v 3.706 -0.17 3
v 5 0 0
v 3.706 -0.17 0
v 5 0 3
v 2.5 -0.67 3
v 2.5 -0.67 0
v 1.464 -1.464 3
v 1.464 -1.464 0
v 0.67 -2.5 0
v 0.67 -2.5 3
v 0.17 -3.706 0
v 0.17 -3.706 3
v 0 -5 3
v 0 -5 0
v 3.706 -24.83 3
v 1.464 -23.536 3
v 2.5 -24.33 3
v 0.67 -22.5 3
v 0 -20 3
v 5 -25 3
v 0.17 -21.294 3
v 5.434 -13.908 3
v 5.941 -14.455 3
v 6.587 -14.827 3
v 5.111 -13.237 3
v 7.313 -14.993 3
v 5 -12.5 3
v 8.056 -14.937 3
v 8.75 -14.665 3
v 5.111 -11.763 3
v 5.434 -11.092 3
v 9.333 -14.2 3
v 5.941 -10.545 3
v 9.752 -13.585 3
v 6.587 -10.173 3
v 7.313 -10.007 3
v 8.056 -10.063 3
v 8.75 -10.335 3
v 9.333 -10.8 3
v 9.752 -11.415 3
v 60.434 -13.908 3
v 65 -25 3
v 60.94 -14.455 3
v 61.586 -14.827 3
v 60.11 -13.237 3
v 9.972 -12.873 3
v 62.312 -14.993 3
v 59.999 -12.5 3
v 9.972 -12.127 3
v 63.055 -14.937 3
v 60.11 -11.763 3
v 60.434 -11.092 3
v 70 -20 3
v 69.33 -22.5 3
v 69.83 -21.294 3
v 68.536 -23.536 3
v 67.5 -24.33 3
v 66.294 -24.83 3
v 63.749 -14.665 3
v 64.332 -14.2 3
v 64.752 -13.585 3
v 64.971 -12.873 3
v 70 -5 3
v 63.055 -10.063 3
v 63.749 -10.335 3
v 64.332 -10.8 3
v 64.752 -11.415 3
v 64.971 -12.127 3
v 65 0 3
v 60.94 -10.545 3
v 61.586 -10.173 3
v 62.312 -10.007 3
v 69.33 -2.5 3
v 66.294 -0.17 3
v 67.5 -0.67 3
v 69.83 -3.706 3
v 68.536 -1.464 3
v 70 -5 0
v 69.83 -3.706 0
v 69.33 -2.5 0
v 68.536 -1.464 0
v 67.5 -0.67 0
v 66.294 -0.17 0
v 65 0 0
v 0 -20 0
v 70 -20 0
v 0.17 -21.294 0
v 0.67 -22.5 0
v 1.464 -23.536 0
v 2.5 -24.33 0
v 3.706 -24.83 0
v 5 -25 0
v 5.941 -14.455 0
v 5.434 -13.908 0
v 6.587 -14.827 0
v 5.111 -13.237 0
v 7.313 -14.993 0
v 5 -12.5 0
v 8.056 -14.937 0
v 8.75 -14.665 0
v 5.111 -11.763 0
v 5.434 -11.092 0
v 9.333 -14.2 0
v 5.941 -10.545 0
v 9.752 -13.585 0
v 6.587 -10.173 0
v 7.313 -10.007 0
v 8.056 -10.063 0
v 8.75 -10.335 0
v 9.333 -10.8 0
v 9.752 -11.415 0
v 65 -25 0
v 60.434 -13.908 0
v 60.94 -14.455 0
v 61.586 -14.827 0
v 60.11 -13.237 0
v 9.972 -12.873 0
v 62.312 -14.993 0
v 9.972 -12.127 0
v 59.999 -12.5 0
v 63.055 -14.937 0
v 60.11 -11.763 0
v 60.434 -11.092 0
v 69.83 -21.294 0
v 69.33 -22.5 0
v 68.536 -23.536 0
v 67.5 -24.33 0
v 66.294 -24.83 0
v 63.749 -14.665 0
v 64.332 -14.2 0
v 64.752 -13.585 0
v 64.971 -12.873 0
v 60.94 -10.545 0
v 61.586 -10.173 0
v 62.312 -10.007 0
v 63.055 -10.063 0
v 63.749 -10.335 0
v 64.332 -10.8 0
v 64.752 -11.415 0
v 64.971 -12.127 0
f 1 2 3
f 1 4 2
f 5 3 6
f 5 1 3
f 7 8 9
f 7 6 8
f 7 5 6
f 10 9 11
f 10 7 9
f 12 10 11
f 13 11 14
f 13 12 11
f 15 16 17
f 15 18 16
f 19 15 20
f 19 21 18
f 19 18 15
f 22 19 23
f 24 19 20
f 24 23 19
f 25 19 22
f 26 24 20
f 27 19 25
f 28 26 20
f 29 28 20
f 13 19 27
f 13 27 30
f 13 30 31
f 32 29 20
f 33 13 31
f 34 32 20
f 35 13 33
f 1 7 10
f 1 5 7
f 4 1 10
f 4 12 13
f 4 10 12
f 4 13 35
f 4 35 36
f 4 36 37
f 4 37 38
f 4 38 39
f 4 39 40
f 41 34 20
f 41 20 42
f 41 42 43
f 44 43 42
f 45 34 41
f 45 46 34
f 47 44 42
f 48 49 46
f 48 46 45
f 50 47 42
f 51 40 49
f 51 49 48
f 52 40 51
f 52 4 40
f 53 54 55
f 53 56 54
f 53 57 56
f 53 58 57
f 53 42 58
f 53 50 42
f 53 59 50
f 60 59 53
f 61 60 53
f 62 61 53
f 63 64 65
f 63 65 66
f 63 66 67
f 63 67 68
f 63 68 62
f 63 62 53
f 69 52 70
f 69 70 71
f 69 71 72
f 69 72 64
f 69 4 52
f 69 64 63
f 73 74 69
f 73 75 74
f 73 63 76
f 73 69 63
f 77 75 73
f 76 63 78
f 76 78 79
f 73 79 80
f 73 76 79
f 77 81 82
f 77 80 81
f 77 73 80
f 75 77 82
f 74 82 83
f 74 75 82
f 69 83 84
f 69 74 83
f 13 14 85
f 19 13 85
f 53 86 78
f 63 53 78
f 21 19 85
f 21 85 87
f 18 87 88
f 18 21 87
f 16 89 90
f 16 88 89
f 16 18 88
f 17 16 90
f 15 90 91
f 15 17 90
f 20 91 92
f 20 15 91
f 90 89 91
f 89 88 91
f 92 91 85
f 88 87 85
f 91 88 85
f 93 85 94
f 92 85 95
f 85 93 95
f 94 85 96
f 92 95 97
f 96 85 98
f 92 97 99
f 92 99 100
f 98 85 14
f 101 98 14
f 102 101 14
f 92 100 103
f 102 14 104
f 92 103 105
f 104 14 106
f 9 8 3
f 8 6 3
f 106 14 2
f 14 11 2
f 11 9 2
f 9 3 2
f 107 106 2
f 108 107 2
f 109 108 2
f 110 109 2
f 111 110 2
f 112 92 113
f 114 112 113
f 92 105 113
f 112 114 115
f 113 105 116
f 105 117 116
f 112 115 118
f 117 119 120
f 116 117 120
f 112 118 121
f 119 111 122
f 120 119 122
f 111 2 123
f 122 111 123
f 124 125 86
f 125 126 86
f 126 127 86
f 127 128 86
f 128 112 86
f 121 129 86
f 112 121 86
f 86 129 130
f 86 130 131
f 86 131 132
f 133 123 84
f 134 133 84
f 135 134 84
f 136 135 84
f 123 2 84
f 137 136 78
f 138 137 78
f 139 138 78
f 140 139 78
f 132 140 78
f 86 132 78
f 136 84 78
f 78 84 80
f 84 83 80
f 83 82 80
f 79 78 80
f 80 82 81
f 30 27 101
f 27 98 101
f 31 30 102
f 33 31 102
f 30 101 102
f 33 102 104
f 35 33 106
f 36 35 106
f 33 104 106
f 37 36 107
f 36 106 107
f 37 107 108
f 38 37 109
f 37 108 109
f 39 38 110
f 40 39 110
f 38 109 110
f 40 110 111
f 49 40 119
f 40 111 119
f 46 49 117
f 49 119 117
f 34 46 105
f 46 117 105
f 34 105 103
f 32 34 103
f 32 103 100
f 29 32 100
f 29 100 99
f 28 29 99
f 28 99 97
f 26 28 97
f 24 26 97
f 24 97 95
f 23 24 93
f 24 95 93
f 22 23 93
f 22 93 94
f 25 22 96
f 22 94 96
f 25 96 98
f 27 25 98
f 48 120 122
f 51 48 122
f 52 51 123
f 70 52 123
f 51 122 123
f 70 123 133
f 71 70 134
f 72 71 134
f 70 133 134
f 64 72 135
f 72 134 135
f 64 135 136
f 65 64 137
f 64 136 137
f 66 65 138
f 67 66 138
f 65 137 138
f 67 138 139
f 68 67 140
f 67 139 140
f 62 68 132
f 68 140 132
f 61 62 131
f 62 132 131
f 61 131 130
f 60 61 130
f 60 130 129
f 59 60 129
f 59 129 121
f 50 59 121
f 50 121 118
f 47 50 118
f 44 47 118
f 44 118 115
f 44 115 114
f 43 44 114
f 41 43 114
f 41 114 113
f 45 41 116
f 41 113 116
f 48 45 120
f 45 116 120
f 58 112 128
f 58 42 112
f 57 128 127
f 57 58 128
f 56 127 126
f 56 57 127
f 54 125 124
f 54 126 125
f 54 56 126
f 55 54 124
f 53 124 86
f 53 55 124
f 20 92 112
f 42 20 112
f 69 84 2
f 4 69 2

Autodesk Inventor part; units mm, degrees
ref_plane "YZ Plane" through (0, 0, 0) normal (1, 0, 0) x (0, 1, 0)
ref_plane "XZ Plane" through (0, 0, 0) normal (0, 1, 0) x (-1, 0, 0)
ref_plane "XY Plane" through (0, 0, 0) normal (0, 0, 1) x (1, 0, 0)
sketch "Sketch1" plane through (0, 0, 0) normal (0, 0, 1) x (1, 0, 0)
  line L0 (0, 0) -> (0, -25)
  line L1 (0, -25) -> (70, -25)
  line L2 (70, -25) -> (70, 0)
  line L3 (70, 0) -> (0, 0)
  dimension "d0" = 25
  dimension "d1" = 70
extrude "Extrusion1" add sketch "Sketch1" along normal blind 3
fillet "Fillet1" radius 5 1 edges at (70, 0, 1.5)
fillet "Fillet2" radius 5 1 edges at (70, -25, 1.5)
fillet "Fillet3" radius 5 1 edges at (0, -25, 1.5)
fillet "Fillet4" radius 5 1 edges at (0, 0, 1.5)
sketch "Sketch2" plane through (0, 0, 0) normal (0, 0, -1) x (-1, 0, 0)
  circle A0 centre (-62.4991, -12.5) radius 2.5
  circle A1 centre (-7.5, -12.5) radius 2.5
  point P0 (0, 0)
extrude "Extrusion2" cut sketch "Sketch2" against normal through all
properties part number "new connect acr" material "Glass"
